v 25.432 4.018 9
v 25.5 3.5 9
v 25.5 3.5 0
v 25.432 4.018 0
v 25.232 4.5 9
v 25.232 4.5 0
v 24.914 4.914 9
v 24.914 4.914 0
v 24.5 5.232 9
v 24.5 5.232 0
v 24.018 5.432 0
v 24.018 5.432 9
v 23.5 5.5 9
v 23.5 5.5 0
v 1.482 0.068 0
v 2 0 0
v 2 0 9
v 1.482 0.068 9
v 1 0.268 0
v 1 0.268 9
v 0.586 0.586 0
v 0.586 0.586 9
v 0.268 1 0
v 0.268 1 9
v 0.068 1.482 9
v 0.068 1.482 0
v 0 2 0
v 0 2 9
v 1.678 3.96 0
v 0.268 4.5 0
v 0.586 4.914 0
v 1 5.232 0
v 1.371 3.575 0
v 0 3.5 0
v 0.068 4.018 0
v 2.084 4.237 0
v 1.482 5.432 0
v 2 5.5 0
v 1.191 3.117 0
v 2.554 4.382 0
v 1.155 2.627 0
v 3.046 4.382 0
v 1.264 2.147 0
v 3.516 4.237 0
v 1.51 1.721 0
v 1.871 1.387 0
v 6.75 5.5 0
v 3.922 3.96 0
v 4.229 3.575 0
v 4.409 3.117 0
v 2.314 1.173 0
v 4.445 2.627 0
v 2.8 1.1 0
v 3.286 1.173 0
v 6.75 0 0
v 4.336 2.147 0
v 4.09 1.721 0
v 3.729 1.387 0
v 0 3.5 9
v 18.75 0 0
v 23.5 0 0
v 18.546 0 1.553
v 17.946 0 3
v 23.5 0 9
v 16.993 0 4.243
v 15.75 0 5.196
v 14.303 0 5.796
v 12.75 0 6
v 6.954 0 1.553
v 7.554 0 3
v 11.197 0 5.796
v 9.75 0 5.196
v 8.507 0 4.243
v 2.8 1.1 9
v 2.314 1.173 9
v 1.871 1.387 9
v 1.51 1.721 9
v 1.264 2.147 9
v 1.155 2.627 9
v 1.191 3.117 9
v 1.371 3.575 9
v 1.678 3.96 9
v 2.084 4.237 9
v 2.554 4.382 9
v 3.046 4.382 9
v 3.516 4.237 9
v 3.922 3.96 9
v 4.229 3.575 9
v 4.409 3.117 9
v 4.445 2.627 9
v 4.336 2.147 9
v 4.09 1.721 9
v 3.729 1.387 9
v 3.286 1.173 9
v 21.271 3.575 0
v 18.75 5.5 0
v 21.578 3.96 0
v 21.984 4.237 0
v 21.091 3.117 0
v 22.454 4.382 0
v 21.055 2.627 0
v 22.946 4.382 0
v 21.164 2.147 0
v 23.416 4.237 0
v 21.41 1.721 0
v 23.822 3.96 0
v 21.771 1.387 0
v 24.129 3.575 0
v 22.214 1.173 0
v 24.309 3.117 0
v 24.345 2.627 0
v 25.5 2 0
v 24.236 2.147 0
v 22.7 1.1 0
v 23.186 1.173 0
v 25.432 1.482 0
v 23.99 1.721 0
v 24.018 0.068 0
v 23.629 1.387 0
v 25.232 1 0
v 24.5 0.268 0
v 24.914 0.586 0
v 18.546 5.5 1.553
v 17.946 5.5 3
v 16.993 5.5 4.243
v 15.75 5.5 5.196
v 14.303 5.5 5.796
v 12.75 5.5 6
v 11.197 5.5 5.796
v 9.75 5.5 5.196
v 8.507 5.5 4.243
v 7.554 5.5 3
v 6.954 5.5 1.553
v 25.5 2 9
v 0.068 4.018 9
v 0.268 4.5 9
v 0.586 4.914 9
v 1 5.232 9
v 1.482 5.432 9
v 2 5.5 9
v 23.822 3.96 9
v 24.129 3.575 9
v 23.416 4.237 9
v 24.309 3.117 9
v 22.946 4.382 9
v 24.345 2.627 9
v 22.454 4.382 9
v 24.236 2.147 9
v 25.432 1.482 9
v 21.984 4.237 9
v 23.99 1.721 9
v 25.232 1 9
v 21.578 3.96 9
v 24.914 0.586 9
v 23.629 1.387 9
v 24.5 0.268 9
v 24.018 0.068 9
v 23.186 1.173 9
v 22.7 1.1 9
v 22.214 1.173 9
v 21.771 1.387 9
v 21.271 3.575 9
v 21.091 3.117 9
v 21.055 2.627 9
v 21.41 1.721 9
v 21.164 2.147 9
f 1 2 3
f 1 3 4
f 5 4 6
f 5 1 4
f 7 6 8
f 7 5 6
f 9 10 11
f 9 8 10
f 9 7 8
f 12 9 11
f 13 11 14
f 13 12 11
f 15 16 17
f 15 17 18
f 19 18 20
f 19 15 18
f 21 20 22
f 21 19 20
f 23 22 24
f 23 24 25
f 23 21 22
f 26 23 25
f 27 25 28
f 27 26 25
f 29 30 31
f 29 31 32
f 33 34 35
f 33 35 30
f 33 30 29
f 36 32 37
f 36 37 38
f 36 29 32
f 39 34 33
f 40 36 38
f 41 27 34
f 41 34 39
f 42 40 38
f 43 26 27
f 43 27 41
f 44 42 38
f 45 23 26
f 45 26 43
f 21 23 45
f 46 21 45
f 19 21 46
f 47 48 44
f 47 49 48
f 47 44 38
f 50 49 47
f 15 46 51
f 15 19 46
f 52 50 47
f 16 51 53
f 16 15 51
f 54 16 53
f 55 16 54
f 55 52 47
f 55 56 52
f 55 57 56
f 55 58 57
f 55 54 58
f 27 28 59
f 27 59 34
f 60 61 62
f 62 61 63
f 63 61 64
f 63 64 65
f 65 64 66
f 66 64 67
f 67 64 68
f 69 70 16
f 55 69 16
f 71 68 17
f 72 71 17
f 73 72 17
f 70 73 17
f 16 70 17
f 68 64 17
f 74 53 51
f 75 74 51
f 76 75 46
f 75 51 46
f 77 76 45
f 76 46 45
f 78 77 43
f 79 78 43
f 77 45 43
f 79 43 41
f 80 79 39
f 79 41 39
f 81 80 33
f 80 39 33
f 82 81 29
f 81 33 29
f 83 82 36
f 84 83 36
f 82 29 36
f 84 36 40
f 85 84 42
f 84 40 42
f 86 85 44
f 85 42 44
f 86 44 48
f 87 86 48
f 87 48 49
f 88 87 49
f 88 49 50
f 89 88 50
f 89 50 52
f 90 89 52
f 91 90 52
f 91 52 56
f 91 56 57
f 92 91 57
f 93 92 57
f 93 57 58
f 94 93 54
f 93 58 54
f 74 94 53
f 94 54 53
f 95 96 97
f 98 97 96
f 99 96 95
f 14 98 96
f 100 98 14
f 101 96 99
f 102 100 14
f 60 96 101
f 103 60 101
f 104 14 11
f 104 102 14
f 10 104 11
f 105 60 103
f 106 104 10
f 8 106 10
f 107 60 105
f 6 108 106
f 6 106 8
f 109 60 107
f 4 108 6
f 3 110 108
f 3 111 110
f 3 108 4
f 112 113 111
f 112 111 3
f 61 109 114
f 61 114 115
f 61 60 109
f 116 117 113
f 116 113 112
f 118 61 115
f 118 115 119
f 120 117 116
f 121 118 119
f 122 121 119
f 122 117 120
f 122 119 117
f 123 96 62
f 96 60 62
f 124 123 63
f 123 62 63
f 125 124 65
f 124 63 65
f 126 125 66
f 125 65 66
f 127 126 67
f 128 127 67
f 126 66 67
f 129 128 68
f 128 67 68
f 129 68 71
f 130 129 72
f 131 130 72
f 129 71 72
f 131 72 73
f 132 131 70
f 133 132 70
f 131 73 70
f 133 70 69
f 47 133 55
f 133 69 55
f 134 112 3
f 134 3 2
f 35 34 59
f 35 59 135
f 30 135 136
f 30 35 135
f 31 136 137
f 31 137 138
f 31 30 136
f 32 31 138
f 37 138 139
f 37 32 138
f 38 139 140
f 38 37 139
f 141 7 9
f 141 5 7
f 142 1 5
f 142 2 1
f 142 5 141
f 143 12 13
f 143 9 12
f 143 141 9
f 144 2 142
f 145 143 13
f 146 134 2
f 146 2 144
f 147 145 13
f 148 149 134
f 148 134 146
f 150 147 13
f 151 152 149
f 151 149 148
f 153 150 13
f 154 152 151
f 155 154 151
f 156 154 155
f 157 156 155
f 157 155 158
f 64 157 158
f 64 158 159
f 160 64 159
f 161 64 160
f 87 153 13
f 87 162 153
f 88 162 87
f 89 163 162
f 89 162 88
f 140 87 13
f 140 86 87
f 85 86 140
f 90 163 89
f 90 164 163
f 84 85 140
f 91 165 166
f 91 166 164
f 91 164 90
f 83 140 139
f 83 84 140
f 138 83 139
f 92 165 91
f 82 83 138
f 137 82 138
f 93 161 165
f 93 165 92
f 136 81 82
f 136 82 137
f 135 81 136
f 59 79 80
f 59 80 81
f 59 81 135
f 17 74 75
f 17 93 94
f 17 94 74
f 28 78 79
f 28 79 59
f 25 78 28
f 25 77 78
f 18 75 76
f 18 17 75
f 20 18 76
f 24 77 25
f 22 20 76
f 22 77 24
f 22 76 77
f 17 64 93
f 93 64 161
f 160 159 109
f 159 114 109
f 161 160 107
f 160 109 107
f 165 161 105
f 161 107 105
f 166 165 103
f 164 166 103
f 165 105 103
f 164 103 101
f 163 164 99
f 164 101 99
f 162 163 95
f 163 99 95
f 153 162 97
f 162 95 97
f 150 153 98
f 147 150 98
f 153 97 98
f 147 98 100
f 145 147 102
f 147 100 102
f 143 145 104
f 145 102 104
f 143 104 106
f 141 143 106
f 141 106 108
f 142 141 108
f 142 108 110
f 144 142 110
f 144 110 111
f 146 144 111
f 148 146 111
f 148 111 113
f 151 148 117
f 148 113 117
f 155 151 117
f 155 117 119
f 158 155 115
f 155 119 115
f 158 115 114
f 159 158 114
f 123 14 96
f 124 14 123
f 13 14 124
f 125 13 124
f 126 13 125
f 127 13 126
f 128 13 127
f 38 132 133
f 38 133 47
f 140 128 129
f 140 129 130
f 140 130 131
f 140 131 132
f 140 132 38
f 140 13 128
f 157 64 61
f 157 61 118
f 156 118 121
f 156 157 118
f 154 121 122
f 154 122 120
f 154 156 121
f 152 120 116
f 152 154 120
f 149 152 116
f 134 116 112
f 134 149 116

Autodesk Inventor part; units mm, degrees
ref_plane "YZ Plane" through (0, 0, 0) normal (1, 0, 0) x (0, 1, 0)
ref_plane "XZ Plane" through (0, 0, 0) normal (0, 1, 0) x (-1, 0, 0)
ref_plane "XY Plane" through (0, 0, 0) normal (0, 0, 1) x (1, 0, 0)
sketch "Skizze1" plane through (0, 0, 0) normal (0, 1, 0) x (-1, 0, 0)
  line L0 (0, 0) -> (-25.5, 0)
  line L1 (-25.5, 0) -> (-25.5, 9)
  line L2 (-25.5, 9) -> (0, 9)
  line L3 (0, 9) -> (0, 0)
  dimension "d0" = 25.5
  dimension "d1" = 9
extrude "Extrusion1" add sketch "Skizze1" along normal blind 5.5
sketch "Skizze2" plane through (0, 0, 0) normal (0, -1, 0) x (1, 0, 0)
  line L0 (25.5, 0) -> (0, 0) projected
  arc A0 (18.75, 0) -> (6.75, 0) centre (12.75, 0) ccw
  dimension "d4" = 12
extrude "Extrusion2" cut sketch "Skizze2" against normal through all
sketch "Skizze5" plane through (0, 0, 9) normal (0, 0, 1) x (1, 0, 0)
  line L0 (0, 0) -> (0, 5.5) construction
  line L1 (0, 2.75) -> (25.5934, 2.75) construction
  line L2 (25.5, 0) -> (0, 0) construction
  line L3 (12.75, 0) -> (12.75, 5.5) construction
  line L4 (0, 5.5) -> (25.5, 5.5) construction
  point P0 (2.8, 2.75)
  point P1 (22.7, 2.75)
  dimension "d33" = 2.8
hole "Bohrung4" at (2.8, 2.75, 9) at (22.7, 2.75, 9) direction (0, 0, -1) diameter 3.3 end through all
fillet "Rundung1" radius 2 4 edges at (25.5, 0, 4.5) (25.5, 5.5, 4.5) (0, 0, 4.5) (0, 5.5, 4.5)
properties part number "Motorhalterung_oben" material "ABS-Kunststoff"
